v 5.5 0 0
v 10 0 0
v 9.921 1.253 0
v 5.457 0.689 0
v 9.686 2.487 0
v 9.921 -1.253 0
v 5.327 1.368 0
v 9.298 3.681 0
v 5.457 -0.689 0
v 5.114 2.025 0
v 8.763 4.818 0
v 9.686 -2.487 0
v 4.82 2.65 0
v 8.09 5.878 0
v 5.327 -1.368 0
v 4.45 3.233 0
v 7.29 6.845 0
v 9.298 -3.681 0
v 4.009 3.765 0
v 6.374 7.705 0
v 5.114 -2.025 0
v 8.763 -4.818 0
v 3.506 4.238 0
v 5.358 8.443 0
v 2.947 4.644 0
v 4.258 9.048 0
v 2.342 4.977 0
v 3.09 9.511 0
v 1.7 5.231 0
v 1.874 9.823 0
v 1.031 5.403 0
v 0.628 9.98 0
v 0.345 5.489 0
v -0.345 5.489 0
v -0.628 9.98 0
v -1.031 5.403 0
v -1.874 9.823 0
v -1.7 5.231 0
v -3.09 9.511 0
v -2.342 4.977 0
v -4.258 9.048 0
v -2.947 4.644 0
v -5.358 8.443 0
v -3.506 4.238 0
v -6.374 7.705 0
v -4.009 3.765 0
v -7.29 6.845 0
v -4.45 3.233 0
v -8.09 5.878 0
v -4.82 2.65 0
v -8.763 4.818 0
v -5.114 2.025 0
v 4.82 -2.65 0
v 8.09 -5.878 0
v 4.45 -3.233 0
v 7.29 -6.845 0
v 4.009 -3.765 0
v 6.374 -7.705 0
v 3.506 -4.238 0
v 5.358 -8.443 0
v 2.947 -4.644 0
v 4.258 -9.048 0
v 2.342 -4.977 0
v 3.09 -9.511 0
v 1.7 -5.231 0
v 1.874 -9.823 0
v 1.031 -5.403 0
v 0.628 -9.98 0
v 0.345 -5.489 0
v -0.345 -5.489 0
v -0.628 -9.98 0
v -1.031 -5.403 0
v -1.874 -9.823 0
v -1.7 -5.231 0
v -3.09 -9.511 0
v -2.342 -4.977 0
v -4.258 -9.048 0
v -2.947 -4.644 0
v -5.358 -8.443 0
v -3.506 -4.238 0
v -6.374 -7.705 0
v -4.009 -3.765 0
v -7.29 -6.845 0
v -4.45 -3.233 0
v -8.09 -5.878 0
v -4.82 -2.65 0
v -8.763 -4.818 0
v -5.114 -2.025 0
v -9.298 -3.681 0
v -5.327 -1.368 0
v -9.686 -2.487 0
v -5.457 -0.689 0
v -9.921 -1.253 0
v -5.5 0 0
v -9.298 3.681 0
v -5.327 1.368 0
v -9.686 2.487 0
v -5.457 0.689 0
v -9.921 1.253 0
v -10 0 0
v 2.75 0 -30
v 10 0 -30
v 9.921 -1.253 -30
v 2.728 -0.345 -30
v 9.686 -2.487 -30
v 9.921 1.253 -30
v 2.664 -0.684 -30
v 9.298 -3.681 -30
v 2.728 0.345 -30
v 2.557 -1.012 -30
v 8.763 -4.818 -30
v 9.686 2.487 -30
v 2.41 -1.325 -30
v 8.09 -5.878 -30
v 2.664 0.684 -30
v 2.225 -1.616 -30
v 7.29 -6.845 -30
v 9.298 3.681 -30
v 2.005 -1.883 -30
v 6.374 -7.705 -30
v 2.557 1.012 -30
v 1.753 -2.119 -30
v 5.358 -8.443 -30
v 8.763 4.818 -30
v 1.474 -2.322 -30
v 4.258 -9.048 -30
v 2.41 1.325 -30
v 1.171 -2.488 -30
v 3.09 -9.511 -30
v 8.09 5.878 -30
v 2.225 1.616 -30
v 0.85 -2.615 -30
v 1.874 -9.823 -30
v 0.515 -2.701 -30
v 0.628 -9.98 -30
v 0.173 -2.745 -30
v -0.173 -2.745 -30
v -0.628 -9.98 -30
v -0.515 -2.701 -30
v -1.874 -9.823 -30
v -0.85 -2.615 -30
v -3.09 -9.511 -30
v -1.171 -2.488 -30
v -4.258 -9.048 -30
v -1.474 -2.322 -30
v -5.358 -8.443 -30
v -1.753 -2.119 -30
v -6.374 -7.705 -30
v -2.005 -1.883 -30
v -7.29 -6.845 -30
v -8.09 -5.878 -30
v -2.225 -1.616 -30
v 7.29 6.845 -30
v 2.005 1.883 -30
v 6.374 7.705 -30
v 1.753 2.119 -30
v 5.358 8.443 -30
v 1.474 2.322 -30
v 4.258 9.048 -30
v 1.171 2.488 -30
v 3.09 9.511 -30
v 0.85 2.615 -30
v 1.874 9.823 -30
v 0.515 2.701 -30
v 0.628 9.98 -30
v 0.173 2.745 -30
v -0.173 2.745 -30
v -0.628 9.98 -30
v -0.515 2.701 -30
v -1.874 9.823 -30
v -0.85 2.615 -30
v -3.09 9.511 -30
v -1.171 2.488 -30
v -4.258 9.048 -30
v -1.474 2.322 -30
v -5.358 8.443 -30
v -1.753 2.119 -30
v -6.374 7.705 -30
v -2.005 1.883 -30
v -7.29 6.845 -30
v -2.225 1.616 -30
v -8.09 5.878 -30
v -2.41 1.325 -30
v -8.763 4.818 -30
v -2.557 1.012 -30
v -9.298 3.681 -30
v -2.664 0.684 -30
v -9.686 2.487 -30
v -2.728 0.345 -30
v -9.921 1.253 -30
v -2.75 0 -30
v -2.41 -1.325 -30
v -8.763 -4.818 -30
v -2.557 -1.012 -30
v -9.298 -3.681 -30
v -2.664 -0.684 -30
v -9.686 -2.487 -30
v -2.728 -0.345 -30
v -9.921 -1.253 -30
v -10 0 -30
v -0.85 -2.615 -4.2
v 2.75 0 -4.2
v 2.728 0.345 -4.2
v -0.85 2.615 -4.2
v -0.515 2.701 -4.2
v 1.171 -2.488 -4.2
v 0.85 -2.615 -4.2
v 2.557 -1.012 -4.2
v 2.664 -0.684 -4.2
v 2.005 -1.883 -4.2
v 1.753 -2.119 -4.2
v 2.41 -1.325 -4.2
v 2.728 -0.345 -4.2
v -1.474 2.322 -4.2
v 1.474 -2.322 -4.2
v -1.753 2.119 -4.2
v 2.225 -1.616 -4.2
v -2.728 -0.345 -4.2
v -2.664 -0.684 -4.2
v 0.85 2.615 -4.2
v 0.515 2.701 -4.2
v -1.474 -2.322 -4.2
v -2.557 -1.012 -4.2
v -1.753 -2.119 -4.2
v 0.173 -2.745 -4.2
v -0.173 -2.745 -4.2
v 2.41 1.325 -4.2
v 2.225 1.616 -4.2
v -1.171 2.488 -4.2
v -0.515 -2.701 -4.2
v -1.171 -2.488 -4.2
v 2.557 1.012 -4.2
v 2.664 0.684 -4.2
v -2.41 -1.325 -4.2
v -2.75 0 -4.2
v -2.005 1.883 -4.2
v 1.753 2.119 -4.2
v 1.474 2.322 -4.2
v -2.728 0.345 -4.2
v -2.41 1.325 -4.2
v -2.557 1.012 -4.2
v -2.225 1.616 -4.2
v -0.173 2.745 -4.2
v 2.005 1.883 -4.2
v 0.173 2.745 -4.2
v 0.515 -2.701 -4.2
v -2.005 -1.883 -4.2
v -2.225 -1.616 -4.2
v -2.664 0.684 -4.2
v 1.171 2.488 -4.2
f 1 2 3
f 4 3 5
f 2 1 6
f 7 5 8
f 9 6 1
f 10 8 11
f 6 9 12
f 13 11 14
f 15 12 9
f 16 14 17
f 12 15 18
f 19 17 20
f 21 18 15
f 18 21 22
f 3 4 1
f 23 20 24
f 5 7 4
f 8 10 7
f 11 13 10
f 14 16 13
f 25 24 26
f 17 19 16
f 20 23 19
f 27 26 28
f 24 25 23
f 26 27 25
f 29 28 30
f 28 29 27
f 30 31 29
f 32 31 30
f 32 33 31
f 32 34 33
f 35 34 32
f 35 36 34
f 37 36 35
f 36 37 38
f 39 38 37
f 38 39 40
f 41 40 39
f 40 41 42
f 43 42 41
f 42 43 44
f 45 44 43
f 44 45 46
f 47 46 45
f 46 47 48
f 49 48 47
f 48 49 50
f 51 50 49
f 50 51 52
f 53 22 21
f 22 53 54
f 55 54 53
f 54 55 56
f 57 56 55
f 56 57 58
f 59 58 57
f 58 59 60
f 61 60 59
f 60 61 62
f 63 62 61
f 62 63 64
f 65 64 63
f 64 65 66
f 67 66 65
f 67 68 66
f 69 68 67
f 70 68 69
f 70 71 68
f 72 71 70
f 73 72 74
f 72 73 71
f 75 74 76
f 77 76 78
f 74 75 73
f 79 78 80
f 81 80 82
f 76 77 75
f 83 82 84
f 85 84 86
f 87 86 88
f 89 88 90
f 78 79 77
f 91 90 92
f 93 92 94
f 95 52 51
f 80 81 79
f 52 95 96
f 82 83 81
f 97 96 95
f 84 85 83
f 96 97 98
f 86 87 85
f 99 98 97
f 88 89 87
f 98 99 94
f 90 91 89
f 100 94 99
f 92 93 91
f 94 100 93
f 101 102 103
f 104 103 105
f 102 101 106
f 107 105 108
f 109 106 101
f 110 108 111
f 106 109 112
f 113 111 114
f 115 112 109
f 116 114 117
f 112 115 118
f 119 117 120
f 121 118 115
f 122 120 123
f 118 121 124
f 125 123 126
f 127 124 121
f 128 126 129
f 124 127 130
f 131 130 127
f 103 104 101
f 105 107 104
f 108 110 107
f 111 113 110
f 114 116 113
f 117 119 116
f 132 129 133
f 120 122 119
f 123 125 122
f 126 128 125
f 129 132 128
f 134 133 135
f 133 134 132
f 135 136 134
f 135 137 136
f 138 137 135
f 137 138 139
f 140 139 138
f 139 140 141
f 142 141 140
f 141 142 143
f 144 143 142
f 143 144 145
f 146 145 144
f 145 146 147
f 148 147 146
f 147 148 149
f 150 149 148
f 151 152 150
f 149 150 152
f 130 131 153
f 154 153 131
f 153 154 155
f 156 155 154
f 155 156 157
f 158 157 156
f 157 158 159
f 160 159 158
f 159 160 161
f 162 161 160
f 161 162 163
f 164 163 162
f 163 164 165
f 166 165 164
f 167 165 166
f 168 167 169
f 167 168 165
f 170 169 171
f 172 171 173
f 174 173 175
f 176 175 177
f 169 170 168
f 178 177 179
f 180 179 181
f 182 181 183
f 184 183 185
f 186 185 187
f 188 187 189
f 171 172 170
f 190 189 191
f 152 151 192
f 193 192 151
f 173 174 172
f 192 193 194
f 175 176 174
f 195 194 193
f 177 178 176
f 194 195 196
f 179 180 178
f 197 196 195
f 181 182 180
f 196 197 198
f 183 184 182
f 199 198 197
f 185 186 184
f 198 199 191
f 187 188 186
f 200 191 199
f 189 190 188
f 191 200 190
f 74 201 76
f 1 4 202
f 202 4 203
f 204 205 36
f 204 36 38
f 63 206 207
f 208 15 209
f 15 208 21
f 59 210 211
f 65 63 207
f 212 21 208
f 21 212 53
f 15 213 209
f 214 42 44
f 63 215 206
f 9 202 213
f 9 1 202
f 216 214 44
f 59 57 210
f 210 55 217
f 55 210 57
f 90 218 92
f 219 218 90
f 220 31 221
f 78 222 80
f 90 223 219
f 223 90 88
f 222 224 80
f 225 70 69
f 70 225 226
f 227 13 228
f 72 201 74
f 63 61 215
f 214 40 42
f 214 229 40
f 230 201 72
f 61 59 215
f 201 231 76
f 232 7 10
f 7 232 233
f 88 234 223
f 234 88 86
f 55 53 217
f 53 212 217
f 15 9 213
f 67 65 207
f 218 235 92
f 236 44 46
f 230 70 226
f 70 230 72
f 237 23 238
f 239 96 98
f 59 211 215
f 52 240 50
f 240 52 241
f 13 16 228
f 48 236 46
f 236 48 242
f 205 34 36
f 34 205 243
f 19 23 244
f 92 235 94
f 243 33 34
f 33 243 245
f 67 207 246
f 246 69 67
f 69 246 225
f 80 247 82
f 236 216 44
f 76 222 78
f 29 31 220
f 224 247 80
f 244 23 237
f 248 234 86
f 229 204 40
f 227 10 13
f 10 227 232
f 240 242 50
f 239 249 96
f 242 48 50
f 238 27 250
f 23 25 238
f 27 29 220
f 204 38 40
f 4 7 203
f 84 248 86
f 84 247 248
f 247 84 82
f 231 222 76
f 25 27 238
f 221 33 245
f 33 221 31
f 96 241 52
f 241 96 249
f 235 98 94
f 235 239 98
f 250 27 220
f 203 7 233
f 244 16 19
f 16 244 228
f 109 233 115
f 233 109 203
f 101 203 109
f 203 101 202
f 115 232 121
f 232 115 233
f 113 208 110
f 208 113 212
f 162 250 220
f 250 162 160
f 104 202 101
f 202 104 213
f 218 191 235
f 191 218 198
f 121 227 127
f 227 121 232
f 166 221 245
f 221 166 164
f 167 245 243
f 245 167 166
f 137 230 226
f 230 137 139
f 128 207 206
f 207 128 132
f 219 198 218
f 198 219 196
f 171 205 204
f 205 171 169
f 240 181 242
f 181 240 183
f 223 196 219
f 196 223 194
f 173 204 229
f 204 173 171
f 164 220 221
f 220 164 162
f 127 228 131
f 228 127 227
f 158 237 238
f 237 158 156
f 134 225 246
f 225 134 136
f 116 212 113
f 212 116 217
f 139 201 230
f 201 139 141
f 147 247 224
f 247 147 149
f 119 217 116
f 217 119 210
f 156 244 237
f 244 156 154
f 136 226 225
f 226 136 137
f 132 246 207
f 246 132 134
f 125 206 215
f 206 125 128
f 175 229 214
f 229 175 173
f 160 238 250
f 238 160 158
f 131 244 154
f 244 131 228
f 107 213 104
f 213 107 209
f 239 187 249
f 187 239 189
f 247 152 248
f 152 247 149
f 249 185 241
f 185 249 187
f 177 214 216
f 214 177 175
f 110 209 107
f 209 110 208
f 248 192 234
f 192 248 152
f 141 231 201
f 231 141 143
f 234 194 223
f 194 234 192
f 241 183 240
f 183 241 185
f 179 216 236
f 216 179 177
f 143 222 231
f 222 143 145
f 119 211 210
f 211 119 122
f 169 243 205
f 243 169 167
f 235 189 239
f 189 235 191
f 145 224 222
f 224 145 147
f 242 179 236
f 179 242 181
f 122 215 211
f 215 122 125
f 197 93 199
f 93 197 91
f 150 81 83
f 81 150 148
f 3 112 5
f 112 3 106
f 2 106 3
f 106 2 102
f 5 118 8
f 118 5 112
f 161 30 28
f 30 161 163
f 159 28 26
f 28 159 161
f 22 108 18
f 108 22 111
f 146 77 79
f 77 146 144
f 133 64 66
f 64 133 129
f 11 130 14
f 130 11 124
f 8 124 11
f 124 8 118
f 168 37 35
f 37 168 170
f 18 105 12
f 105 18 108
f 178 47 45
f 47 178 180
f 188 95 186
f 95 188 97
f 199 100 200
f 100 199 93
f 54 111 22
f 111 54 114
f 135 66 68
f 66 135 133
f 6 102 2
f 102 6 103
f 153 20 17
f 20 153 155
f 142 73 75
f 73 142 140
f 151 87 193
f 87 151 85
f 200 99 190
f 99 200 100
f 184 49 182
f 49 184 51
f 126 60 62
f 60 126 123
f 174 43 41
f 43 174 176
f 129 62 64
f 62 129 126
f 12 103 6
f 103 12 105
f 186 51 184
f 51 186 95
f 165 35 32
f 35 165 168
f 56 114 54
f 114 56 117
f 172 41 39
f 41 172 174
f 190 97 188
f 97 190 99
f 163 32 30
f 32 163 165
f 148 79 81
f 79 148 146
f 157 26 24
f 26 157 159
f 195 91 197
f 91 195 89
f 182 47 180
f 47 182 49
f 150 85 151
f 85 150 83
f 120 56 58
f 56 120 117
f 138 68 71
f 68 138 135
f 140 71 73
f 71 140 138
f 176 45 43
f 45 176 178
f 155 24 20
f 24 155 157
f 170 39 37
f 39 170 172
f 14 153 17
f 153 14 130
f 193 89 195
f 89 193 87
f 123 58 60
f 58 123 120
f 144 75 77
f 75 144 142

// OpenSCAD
$fn = 50;


difference() {
	union() {
		translate(v = [0, 0, -30.0000000000]) {
			cylinder(h = 30, r = 10.0000000000);
		}
		cylinder(h = 0, r = 20.0000000000);
	}
	union() {
		translate(v = [0, 0, 0]) {
			rotate(a = [0, 0, 0]) {
				difference() {
					union() {
						#translate(v = [0, 0, -30.0000000000]) {
							cylinder(h = 30, r = 2.2500000000);
						}
						#translate(v = [0, 0, -4.2000000000]) {
							cylinder(h = 4.2000000000, r1 = 2.7500000000, r2 = 5.5000000000);
						}
						#translate(v = [0, 0, -30.0000000000]) {
							cylinder(h = 30, r = 2.7500000000);
						}
						#translate(v = [0, 0, -30.0000000000]) {
							cylinder(h = 30, r = 2.2500000000);
						}
					}
					union();
				}
			}
		}
	}
}
